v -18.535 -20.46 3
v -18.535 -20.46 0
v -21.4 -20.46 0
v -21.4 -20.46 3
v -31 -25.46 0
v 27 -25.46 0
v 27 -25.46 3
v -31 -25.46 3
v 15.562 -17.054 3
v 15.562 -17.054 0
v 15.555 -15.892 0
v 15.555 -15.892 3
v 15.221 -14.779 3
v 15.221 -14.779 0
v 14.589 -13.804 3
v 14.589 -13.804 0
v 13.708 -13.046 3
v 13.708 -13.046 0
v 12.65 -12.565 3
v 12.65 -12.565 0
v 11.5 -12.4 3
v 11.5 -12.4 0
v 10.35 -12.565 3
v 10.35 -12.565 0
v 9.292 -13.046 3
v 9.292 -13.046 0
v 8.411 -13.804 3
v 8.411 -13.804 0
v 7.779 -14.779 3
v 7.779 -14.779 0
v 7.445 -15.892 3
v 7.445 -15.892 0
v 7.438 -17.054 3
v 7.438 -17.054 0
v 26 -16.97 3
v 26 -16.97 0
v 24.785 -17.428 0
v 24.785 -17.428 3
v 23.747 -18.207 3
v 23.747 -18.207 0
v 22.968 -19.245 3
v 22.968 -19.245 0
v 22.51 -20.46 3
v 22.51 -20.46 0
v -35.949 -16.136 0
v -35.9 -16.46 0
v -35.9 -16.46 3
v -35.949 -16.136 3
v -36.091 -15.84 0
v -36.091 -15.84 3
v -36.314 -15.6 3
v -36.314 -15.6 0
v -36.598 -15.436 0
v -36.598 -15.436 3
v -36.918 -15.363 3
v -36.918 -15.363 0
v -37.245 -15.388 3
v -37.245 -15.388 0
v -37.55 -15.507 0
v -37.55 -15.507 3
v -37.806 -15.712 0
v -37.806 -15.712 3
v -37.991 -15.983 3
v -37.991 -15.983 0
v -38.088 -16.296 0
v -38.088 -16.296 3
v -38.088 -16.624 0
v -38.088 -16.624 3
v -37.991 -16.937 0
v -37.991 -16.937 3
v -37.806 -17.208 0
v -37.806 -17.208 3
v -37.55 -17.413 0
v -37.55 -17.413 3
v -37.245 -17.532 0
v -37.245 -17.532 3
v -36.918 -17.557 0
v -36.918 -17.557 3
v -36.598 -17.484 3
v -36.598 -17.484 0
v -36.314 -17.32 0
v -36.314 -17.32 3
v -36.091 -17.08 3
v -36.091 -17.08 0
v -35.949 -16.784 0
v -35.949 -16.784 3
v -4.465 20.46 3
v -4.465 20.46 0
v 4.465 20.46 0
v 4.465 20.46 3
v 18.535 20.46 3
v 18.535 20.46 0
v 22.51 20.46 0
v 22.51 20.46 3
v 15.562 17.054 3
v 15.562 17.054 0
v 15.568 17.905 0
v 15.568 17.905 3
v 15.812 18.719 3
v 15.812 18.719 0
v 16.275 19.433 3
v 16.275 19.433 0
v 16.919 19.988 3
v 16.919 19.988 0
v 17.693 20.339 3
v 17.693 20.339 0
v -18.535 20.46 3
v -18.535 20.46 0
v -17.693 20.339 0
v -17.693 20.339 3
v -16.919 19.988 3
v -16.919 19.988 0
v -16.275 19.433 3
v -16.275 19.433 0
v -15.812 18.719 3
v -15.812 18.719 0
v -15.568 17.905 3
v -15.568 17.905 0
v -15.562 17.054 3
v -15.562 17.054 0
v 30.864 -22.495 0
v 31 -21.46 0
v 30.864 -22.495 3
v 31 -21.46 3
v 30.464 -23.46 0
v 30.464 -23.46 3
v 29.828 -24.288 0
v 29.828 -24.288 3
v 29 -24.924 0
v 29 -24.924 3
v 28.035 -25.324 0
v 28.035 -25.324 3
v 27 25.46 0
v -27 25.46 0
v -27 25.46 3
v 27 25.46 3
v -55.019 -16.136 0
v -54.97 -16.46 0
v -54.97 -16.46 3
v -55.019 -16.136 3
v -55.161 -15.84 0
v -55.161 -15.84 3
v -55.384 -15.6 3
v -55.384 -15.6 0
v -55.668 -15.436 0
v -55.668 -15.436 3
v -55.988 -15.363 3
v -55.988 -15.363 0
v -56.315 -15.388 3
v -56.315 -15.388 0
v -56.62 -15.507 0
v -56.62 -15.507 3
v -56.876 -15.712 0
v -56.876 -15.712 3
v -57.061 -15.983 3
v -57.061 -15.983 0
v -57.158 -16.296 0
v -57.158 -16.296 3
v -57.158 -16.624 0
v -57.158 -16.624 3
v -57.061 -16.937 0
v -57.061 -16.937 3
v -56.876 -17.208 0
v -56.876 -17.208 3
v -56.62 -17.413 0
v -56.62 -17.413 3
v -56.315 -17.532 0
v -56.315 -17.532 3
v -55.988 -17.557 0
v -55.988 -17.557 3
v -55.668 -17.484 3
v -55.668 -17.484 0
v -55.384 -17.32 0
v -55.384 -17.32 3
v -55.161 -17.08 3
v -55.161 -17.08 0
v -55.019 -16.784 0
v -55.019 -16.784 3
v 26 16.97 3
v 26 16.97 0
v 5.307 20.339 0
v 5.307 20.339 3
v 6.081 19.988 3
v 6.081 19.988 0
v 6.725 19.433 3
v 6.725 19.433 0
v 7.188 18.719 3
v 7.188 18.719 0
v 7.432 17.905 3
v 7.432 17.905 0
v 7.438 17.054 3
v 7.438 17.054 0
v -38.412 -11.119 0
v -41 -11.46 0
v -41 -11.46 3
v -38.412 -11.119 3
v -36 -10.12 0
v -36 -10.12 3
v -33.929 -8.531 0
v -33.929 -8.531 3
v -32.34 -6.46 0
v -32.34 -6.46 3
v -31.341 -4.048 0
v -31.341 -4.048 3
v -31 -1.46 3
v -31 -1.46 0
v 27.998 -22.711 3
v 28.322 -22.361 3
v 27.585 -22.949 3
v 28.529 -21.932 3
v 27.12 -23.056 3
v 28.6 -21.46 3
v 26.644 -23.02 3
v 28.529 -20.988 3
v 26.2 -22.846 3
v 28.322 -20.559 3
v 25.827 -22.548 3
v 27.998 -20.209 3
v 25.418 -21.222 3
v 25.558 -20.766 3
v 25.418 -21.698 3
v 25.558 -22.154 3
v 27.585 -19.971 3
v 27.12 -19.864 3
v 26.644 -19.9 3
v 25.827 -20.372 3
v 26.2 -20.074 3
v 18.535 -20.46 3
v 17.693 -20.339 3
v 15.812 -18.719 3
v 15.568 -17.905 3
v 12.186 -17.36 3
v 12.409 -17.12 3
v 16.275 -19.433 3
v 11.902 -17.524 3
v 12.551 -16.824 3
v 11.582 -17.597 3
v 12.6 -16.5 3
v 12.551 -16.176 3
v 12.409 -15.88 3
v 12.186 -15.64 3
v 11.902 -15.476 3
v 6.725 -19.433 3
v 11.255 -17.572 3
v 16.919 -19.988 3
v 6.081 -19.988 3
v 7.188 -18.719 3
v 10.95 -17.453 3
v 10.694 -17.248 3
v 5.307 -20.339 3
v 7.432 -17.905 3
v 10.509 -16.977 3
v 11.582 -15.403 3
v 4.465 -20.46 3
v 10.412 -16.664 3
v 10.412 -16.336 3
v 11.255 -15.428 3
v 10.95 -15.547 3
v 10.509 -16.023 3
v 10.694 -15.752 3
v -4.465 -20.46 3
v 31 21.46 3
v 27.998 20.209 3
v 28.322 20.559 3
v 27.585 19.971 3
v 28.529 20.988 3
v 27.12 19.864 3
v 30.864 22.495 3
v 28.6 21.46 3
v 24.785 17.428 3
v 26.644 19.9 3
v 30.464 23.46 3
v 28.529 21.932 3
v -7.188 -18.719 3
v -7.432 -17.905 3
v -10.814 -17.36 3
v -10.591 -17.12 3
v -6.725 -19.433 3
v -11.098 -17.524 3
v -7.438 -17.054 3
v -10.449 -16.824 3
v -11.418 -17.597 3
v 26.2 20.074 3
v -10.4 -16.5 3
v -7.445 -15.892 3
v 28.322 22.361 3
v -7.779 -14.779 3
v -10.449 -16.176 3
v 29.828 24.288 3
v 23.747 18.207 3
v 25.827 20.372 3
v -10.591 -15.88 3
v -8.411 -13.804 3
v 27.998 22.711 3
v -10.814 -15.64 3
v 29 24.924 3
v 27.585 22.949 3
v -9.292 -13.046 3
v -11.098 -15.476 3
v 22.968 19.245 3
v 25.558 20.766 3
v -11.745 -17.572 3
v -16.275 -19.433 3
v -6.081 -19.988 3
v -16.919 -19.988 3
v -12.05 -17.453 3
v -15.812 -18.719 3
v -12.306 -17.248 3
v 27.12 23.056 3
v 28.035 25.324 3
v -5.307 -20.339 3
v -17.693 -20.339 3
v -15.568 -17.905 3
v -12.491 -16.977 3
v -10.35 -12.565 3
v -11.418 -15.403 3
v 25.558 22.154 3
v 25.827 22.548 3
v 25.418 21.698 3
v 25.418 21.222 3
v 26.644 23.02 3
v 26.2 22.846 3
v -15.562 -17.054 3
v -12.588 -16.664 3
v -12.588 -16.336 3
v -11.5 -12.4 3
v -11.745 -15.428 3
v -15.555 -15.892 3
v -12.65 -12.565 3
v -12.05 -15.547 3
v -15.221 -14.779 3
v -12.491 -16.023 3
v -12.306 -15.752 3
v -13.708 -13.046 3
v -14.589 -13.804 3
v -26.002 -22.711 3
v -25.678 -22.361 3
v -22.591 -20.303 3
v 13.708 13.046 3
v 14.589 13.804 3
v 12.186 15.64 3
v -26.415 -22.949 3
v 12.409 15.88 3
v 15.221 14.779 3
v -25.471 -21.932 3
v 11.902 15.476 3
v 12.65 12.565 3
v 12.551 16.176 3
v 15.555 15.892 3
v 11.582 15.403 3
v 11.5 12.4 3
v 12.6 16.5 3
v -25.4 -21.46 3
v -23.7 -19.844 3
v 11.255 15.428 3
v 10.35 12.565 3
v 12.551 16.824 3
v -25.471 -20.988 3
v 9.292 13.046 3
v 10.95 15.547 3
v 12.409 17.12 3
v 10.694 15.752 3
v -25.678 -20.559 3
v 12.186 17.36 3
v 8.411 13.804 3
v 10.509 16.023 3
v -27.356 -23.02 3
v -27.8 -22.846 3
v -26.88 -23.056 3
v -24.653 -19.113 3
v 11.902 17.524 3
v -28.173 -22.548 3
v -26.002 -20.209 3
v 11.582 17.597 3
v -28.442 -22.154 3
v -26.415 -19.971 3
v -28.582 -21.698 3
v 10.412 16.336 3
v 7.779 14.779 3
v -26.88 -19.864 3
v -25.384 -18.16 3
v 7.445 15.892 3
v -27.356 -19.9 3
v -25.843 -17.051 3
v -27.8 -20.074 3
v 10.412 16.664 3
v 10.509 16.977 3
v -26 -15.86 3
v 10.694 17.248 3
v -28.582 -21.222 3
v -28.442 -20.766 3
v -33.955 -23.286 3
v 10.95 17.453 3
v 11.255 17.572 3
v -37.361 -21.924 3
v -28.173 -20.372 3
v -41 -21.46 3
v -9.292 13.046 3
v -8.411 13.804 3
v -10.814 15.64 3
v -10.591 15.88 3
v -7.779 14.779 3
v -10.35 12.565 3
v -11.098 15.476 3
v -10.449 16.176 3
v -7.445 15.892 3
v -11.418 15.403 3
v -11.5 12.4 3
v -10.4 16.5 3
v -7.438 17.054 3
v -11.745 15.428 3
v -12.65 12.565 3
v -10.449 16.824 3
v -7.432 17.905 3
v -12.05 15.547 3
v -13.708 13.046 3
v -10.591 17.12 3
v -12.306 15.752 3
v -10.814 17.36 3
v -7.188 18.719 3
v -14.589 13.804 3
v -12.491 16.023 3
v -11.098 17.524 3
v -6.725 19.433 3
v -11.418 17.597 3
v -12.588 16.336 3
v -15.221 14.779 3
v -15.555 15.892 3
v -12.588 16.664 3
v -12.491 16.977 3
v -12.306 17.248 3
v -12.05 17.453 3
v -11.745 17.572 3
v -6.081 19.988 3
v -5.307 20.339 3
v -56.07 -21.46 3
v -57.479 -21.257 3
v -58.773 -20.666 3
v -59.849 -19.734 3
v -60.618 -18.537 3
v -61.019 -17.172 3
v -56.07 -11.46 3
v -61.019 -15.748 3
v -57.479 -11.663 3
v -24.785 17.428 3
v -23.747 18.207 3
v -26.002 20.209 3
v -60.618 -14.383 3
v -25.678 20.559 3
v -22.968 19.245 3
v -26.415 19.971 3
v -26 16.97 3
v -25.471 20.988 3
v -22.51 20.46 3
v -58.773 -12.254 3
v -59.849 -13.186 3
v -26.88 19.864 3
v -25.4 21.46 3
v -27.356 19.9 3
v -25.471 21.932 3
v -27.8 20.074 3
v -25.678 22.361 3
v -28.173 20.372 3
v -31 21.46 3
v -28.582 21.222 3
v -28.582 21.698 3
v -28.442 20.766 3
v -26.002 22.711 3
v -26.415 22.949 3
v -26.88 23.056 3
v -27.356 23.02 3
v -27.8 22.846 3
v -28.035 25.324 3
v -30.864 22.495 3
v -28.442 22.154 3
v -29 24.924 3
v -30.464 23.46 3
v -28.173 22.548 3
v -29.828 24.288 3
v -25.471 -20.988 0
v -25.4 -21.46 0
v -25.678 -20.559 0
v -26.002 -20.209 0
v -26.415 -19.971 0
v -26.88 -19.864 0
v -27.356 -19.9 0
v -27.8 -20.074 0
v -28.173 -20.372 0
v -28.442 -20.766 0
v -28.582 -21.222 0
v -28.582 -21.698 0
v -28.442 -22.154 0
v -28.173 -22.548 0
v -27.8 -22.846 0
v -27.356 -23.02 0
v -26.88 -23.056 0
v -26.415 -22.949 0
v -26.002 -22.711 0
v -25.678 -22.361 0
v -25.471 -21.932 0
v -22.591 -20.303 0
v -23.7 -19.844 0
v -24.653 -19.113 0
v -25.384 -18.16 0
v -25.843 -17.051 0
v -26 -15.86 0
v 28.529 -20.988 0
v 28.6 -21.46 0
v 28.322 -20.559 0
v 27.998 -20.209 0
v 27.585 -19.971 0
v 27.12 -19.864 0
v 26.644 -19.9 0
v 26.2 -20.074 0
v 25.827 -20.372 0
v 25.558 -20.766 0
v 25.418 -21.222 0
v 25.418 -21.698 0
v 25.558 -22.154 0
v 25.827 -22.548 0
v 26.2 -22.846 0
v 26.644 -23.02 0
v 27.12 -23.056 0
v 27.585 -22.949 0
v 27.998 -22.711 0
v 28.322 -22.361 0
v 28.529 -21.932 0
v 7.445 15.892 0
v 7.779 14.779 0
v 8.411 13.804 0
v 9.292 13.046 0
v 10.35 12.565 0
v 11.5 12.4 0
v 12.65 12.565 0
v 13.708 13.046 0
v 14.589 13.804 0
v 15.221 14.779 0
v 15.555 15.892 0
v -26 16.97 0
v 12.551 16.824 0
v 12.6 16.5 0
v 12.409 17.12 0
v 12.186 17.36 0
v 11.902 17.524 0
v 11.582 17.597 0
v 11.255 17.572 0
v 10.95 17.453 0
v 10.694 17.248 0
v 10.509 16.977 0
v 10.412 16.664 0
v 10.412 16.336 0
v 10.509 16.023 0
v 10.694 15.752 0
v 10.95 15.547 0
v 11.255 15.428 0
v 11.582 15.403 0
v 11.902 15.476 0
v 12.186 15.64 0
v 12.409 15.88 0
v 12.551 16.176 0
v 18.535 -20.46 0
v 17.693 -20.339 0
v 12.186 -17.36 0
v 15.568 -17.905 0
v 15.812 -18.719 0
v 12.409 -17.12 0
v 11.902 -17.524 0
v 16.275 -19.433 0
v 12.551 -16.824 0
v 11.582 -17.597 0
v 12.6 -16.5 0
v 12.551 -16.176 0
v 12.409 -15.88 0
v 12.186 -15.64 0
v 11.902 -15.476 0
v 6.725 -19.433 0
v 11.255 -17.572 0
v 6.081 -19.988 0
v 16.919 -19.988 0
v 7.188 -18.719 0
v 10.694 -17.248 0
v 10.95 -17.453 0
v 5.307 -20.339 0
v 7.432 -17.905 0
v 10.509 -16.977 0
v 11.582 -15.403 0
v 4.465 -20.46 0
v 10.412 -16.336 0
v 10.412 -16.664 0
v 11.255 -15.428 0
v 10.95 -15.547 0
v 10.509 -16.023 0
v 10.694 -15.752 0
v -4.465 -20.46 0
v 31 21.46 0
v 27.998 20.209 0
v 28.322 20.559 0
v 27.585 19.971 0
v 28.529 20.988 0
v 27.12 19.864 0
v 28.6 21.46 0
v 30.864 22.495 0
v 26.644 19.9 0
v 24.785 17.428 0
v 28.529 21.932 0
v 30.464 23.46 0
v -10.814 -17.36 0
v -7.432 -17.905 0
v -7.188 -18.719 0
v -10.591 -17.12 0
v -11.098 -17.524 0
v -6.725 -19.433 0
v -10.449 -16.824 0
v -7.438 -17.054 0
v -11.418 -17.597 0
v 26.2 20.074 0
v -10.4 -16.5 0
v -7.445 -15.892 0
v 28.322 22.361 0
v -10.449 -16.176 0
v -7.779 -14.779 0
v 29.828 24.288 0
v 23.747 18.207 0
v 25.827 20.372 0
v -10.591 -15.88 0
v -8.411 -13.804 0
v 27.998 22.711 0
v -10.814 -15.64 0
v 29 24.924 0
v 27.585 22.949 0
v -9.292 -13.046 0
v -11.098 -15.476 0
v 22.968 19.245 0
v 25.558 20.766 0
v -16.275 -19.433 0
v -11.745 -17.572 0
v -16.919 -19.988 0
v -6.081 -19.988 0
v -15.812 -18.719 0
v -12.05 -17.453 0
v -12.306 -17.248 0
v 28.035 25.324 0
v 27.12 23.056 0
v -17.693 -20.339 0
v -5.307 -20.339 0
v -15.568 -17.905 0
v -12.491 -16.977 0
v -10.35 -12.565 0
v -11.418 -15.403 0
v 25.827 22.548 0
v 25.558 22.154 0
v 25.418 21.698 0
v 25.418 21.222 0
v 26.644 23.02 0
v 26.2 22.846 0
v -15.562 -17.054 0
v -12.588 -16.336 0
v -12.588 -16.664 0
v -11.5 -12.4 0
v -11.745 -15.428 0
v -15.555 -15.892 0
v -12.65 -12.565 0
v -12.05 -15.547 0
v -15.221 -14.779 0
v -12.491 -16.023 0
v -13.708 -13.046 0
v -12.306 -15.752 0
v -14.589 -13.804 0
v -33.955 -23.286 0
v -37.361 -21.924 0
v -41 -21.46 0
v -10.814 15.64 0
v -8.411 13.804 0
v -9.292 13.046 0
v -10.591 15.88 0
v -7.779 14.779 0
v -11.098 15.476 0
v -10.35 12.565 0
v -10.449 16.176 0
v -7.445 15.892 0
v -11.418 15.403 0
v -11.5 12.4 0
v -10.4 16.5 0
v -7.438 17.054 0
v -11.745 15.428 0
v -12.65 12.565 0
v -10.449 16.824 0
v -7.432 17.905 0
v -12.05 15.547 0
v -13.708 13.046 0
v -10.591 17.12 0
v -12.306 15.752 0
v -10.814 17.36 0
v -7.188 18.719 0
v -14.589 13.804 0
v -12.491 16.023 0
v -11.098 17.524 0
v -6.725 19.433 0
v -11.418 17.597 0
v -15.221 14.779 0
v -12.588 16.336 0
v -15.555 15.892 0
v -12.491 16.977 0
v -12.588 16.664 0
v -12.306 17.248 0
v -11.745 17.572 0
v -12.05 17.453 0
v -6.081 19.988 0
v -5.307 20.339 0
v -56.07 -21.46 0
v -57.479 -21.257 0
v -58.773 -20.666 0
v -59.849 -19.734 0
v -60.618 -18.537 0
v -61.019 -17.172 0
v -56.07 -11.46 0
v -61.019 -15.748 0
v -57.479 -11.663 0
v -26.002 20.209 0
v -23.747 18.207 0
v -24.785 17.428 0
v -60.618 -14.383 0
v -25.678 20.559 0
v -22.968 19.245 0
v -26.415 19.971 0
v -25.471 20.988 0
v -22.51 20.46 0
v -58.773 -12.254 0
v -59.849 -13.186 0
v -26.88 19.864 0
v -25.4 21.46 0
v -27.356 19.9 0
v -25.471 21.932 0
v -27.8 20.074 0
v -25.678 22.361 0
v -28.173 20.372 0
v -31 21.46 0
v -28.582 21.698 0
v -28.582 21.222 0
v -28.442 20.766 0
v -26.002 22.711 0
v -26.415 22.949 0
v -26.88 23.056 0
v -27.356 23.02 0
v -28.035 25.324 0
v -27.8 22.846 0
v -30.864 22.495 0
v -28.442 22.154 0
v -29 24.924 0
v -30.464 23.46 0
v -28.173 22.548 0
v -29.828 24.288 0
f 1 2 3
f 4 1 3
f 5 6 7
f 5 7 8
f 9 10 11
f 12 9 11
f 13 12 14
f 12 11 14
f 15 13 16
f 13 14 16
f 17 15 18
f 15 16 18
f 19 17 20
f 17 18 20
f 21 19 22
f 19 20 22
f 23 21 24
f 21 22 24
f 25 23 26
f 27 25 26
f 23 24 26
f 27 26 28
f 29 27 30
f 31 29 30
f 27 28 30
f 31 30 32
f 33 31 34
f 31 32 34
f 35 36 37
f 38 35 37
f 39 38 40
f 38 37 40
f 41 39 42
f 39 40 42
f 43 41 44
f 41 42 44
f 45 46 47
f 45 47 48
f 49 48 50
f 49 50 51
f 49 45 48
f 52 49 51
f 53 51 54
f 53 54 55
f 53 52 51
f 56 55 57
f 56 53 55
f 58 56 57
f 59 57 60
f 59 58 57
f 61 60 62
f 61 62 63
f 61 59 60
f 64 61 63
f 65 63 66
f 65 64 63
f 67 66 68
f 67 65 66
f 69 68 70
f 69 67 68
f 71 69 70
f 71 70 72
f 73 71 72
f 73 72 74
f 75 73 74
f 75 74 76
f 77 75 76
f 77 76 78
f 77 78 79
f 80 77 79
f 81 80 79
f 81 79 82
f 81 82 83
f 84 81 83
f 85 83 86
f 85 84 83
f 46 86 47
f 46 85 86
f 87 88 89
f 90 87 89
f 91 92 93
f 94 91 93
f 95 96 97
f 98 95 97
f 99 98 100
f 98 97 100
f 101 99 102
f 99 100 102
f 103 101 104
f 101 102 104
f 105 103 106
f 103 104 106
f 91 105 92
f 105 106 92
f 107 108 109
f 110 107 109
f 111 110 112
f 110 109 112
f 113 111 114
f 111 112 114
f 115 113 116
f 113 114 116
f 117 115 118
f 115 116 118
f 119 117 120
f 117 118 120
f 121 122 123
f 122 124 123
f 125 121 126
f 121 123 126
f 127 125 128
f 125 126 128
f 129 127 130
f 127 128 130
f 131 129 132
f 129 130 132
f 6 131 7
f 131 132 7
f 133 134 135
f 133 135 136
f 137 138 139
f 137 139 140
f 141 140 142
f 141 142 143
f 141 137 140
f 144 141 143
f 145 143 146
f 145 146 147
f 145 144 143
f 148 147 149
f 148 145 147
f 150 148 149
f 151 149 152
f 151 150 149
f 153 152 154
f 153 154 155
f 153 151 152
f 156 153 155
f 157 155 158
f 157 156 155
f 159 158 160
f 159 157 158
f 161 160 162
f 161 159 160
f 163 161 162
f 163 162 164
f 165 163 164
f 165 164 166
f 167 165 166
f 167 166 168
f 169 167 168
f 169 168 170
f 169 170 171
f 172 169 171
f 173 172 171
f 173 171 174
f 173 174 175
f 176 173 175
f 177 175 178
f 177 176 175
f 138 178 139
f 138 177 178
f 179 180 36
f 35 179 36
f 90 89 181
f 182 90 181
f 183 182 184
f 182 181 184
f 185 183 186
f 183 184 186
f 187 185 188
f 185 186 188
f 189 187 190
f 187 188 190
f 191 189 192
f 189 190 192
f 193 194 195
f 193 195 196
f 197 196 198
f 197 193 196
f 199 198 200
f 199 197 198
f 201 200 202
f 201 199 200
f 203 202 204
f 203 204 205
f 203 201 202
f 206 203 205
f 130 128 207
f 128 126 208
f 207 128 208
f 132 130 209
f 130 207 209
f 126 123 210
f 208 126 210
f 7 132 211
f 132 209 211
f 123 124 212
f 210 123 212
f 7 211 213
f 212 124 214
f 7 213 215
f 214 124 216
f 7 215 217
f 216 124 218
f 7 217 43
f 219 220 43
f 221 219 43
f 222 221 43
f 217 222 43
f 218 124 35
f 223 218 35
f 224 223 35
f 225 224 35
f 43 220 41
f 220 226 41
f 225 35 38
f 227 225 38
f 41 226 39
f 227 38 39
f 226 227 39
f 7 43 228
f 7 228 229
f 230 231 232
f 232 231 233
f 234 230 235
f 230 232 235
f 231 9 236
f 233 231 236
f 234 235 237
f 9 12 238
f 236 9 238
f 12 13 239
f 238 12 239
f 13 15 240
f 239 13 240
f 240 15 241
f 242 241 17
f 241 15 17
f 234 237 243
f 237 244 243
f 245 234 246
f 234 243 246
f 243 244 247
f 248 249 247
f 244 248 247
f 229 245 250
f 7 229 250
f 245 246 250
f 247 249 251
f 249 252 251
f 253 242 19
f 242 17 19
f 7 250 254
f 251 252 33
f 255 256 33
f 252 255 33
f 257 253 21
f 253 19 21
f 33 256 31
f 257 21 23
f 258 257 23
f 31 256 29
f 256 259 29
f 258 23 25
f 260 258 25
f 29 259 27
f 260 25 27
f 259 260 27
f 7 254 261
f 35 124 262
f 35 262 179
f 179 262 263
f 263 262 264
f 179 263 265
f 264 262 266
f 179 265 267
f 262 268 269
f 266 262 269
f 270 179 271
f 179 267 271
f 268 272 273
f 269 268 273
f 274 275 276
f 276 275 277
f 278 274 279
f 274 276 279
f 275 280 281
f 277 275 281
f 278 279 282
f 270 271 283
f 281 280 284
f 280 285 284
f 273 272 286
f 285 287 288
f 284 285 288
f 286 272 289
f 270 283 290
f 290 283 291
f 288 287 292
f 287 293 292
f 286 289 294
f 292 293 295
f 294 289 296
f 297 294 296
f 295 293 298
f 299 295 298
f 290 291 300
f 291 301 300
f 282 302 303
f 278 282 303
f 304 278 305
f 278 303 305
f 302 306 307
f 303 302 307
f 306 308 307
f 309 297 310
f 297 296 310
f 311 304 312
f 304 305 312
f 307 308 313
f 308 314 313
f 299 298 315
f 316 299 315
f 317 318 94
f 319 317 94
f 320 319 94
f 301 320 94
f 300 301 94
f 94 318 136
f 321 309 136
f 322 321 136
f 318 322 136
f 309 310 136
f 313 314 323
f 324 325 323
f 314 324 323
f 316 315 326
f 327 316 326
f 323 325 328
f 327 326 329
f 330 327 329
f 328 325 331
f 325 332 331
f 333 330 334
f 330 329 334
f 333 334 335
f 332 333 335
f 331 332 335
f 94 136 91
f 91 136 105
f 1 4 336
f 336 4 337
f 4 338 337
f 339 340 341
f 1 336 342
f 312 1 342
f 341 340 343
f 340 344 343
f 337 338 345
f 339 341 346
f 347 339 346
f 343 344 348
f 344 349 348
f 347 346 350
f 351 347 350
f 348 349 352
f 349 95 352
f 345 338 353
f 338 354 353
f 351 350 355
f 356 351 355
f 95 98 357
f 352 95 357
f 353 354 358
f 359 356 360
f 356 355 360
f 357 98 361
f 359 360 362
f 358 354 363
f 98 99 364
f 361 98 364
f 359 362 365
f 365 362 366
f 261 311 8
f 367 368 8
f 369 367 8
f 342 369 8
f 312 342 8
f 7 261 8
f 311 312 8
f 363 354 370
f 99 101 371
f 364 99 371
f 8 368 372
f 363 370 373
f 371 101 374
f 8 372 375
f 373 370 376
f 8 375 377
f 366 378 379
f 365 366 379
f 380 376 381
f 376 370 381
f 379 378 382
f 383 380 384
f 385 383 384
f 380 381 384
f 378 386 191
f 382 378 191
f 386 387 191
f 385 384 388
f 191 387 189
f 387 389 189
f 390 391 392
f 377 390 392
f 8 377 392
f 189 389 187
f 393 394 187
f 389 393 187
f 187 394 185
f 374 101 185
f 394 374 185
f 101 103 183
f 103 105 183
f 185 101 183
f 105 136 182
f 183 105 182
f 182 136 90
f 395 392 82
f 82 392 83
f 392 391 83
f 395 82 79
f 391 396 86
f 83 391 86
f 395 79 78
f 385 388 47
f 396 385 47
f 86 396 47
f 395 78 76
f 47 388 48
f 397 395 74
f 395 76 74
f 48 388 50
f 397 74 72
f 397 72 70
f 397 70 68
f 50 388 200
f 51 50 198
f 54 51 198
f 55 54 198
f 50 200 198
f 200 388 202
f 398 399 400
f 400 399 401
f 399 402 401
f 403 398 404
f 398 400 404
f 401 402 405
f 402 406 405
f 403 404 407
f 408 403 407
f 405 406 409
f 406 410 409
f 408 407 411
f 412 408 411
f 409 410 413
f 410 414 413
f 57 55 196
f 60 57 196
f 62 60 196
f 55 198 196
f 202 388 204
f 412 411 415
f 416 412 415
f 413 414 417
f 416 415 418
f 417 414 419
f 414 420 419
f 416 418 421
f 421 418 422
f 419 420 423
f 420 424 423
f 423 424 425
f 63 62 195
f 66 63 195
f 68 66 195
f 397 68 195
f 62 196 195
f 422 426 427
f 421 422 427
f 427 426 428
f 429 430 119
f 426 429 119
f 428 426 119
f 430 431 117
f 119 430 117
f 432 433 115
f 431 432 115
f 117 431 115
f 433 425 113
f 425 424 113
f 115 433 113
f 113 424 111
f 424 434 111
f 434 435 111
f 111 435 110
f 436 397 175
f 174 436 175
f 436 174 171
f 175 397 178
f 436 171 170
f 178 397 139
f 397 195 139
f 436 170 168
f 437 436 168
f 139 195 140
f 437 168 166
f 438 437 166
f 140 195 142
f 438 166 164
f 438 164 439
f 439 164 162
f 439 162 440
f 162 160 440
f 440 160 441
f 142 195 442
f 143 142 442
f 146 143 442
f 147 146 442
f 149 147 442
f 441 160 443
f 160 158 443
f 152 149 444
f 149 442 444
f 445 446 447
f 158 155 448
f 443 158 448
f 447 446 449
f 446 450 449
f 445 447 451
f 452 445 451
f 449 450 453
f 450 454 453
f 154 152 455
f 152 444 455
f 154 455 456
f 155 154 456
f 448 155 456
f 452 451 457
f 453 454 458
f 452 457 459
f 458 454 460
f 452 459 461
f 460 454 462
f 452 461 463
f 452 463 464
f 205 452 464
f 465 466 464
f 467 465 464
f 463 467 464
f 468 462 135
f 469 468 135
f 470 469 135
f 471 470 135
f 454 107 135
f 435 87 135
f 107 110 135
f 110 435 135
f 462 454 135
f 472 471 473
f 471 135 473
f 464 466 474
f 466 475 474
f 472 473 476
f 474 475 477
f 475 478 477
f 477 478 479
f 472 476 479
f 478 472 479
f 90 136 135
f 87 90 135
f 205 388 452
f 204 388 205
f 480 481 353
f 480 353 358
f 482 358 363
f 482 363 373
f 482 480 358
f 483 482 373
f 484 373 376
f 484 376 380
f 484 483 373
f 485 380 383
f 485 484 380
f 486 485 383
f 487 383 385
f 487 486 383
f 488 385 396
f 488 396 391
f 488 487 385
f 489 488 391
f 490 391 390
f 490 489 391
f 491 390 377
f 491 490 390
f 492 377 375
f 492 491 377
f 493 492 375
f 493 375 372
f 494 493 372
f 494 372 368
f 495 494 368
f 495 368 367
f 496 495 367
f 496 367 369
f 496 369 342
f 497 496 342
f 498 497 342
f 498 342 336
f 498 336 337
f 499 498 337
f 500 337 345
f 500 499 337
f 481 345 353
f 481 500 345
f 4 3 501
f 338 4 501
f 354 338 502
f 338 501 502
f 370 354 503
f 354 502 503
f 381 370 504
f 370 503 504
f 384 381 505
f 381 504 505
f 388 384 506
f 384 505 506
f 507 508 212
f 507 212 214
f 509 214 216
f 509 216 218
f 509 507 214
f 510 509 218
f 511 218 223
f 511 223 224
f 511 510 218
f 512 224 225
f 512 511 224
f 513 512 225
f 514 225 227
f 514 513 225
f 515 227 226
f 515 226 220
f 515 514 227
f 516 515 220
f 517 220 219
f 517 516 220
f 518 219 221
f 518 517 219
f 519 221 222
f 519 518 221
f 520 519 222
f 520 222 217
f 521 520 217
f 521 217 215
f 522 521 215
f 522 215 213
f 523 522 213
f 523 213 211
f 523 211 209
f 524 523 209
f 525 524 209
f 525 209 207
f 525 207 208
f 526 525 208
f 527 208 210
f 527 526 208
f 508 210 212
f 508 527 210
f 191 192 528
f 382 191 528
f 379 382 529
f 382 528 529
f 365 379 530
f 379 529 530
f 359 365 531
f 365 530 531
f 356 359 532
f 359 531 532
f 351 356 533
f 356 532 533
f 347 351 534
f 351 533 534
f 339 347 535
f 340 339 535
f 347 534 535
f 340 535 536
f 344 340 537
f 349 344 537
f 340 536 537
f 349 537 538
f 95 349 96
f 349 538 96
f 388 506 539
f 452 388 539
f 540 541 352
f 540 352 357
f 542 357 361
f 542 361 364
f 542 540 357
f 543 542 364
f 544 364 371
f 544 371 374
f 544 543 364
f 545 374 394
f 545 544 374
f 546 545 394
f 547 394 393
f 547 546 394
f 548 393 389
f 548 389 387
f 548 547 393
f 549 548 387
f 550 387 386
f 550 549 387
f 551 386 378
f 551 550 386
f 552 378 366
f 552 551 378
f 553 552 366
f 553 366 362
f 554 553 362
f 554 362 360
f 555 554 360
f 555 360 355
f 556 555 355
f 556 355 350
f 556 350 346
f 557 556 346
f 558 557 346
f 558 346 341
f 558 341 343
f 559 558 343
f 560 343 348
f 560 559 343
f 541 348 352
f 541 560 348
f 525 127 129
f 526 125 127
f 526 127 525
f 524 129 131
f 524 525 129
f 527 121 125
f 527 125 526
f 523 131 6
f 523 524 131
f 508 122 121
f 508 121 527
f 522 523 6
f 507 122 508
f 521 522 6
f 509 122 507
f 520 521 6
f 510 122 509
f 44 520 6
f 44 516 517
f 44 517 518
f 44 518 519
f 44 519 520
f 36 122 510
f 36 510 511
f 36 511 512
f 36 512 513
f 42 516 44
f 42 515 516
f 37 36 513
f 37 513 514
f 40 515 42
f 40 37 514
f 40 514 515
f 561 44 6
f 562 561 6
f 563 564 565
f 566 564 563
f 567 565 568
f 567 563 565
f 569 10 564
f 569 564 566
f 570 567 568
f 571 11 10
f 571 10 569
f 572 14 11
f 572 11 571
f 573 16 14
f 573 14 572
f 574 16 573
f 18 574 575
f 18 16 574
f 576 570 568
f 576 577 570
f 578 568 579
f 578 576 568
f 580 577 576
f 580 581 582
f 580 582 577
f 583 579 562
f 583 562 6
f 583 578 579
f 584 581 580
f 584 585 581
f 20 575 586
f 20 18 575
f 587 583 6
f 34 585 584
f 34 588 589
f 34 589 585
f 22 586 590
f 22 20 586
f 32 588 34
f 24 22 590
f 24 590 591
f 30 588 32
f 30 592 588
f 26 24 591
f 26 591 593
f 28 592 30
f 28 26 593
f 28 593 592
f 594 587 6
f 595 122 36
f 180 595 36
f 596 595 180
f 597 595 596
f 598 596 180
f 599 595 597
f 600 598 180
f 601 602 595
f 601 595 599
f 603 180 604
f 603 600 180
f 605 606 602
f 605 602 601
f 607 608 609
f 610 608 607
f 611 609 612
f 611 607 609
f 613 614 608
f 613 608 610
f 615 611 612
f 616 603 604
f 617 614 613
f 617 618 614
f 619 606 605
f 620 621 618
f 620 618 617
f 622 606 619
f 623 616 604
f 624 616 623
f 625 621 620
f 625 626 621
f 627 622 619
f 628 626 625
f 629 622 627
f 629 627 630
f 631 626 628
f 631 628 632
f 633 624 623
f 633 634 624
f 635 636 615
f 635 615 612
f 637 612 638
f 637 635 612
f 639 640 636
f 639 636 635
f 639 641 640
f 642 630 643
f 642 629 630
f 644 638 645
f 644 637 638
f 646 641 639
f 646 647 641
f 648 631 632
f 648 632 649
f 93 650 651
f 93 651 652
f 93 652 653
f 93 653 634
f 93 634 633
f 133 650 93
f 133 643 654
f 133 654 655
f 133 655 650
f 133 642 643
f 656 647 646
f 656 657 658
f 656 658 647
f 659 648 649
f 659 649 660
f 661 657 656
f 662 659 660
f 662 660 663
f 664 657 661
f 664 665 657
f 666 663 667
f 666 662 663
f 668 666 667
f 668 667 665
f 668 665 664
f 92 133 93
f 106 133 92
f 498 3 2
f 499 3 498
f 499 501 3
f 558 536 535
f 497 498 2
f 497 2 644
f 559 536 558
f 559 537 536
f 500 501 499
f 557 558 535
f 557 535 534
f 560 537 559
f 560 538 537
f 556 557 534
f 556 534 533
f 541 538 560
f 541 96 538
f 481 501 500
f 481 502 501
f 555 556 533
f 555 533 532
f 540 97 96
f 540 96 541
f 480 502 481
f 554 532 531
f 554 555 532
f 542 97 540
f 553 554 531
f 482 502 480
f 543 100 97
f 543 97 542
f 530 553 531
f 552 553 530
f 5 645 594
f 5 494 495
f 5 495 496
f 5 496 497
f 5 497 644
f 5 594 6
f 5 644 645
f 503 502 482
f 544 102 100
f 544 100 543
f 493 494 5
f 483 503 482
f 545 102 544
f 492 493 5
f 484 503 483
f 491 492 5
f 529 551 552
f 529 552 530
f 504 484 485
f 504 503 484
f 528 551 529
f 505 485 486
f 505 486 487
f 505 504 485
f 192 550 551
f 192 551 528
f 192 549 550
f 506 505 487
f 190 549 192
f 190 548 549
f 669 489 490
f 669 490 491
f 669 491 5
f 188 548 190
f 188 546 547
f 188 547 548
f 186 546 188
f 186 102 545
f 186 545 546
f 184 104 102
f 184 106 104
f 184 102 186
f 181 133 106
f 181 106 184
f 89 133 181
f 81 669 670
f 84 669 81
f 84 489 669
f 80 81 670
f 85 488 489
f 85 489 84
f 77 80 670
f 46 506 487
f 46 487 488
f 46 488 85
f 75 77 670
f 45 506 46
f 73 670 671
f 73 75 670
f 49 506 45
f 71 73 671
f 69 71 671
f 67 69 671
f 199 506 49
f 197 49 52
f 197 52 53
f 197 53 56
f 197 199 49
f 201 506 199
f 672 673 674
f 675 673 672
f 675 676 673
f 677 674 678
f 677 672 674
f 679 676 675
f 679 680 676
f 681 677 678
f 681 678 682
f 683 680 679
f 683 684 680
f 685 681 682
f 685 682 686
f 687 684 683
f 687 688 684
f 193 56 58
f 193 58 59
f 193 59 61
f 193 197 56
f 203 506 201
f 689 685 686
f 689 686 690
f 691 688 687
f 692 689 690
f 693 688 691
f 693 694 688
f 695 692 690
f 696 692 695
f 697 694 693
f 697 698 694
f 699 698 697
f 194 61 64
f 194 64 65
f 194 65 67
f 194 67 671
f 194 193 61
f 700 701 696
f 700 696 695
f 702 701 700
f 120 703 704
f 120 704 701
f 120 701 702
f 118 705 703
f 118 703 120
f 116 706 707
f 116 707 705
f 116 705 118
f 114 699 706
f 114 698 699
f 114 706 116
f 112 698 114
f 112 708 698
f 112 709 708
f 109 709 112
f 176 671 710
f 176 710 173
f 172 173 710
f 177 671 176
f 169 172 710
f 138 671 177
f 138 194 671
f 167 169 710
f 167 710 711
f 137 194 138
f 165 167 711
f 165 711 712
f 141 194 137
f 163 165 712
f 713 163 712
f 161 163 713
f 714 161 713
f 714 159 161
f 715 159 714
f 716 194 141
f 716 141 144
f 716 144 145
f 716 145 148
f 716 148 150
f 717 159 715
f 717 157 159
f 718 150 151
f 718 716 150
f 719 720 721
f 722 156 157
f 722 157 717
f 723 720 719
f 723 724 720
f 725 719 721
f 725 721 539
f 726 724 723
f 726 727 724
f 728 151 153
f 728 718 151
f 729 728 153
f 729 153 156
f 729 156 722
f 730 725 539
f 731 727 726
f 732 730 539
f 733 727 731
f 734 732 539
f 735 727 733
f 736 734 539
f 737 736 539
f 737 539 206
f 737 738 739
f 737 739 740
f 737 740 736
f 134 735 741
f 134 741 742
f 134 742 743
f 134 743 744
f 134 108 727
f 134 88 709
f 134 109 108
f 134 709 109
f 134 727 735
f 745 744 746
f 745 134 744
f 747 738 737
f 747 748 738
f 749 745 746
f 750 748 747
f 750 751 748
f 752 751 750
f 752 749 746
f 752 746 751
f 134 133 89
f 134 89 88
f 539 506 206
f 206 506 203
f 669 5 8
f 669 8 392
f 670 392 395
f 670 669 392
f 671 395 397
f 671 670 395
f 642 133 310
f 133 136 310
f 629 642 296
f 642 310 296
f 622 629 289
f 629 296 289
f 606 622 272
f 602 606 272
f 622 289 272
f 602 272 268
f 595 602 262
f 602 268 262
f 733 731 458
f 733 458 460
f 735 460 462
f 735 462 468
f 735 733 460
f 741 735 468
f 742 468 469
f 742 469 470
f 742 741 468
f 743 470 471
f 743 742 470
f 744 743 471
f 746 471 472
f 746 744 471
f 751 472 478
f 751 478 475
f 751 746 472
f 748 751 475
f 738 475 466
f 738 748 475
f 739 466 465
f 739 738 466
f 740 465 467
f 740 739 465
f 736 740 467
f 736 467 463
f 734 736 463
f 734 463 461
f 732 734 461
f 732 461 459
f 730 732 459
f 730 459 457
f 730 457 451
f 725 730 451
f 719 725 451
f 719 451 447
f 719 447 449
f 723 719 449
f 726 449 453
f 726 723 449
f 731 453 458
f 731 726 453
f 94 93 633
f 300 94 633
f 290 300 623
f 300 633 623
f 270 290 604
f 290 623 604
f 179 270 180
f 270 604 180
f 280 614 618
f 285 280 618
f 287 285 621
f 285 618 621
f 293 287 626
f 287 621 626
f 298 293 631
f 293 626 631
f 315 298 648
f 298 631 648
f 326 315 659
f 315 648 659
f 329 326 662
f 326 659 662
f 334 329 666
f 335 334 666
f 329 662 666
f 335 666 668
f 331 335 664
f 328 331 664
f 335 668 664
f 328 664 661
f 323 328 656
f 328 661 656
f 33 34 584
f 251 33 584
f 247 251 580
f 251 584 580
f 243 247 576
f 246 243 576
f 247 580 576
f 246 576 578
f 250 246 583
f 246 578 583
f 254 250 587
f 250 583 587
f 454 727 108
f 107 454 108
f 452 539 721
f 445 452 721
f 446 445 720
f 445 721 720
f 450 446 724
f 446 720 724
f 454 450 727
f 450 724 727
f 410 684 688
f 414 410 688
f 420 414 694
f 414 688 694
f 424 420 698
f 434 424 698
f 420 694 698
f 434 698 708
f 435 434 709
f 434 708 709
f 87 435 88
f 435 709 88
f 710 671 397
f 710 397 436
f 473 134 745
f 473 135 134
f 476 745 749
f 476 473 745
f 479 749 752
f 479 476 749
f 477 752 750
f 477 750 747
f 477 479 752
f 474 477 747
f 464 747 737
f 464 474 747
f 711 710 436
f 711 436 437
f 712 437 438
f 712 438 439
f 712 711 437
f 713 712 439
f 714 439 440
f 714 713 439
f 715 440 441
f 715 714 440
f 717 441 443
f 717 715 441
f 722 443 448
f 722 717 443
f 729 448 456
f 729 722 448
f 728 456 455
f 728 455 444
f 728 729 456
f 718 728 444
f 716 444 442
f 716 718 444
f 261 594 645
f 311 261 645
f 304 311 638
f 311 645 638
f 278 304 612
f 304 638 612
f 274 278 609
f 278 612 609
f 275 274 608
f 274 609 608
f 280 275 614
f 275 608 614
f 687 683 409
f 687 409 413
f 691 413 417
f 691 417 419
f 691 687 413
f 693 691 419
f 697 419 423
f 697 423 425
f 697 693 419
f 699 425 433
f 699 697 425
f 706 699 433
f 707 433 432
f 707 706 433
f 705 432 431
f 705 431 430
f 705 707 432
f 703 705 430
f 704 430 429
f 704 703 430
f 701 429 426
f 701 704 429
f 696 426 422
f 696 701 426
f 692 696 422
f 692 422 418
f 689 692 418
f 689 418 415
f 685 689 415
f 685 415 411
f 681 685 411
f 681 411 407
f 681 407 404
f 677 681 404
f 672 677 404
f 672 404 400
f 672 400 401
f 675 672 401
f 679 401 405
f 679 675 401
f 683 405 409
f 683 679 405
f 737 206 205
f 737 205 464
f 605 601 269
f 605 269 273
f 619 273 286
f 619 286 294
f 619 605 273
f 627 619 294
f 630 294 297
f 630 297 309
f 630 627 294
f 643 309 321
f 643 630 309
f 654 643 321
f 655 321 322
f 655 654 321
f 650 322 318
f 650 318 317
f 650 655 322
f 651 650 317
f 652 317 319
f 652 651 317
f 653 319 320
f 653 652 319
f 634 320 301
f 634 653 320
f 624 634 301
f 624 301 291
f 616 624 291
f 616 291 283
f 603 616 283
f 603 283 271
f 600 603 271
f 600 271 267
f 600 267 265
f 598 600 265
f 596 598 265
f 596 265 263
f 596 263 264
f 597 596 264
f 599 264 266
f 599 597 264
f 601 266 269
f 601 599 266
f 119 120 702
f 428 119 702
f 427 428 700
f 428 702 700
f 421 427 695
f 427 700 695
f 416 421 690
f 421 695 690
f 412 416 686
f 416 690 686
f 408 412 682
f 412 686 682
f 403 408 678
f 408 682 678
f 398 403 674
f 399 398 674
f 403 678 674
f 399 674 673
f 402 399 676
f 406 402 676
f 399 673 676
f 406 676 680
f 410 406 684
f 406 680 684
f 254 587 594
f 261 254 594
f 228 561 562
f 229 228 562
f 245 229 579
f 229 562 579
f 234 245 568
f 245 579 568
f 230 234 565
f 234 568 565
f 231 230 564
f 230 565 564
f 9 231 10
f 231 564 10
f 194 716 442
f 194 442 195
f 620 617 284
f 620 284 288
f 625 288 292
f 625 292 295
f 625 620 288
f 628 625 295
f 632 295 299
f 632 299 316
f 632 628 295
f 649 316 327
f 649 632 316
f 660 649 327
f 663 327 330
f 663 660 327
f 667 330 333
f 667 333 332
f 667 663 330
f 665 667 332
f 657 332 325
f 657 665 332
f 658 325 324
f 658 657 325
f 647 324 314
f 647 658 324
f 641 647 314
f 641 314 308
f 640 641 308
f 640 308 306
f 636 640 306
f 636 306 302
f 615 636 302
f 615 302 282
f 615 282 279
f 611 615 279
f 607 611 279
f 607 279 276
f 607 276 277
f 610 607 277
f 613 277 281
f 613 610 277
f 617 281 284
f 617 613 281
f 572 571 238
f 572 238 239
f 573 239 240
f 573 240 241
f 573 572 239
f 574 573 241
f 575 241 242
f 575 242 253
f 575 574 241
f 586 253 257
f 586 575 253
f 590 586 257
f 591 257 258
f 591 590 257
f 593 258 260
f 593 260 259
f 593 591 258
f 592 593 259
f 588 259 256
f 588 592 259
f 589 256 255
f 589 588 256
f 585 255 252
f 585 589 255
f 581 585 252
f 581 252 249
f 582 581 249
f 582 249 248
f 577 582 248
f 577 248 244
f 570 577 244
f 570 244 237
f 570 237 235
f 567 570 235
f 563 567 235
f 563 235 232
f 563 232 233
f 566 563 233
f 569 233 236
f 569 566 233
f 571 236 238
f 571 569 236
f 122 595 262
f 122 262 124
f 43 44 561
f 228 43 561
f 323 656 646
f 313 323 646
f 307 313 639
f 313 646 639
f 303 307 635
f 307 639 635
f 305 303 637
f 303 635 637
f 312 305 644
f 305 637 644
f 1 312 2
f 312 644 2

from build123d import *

# Parameters (mm, degrees)
SKETCH_1_R      = 1.6
SKETCH_1_R_2    = 1.1
EXTRUDE_1_DEPTH = 3
FILLET_2_R      = 4


with BuildPart() as part:
    # 草图1 → 凸台-拉伸1 (new body)
    with BuildSketch(Plane.XY):
        with BuildLine():
            Line((-31, 25.46), (31, 25.46))
            Line((31, 25.46), (31, -25.46))
            Line((31, -25.46), (-31, -25.46))
            ThreePointArc((-31, -25.46), (-35.614835193, -22.497087982), (-41, -21.46))
            Line((-41, -21.46), (-56.07, -21.46))
            ThreePointArc((-56.07, -21.46), (-61.07, -16.46), (-56.07, -11.46))
            Line((-56.07, -11.46), (-41, -11.46))
            ThreePointArc((-41, -11.46), (-33.928932188, -8.531067812), (-31, -1.46))
            Line((-31, -1.46), (-31, 25.46))
        make_face()
        with Locations((-27, 21.46)):
            Circle(SKETCH_1_R, mode=Mode.SUBTRACT)
        with Locations((27, 21.46)):
            Circle(SKETCH_1_R, mode=Mode.SUBTRACT)
        with Locations((-27, -21.46)):
            Circle(SKETCH_1_R, mode=Mode.SUBTRACT)
        with Locations((27, -21.46)):
            Circle(SKETCH_1_R, mode=Mode.SUBTRACT)
        with Locations((-11.5, 16.5)):
            Circle(SKETCH_1_R_2, mode=Mode.SUBTRACT)
        with Locations((11.5, 16.5)):
            Circle(SKETCH_1_R_2, mode=Mode.SUBTRACT)
        with Locations((11.5, -16.5)):
            Circle(SKETCH_1_R_2, mode=Mode.SUBTRACT)
        with Locations((-11.5, -16.5)):
            Circle(SKETCH_1_R_2, mode=Mode.SUBTRACT)
        with Locations((-56.07, -16.46)):
            Circle(SKETCH_1_R_2, mode=Mode.SUBTRACT)
        with Locations((-37, -16.46)):
            Circle(SKETCH_1_R_2, mode=Mode.SUBTRACT)
        with BuildLine():
            Line((-22.510011136, 20.46), (-18.534799215, 20.46))
            ThreePointArc((-18.534799215, 20.46), (-16.274611014, 19.432701015), (-15.562348843, 17.054366197))
            ThreePointArc((-15.562348843, 17.054366197), (-11.5, 12.4), (-7.437651157, 17.054366197))
            ThreePointArc((-7.437651157, 17.054366197), (-6.725388986, 19.432701015), (-4.465200785, 20.46))
            Line((-4.465200785, 20.46), (4.465200785, 20.46))
            ThreePointArc((4.465200785, 20.46), (6.725388986, 19.432701015), (7.437651157, 17.054366197))
            ThreePointArc((7.437651157, 17.054366197), (11.5, 12.4), (15.562348843, 17.054366197))
            ThreePointArc((15.562348843, 17.054366197), (16.274611014, 19.432701015), (18.534799215, 20.46))
            Line((18.534799215, 20.46), (22.510011136, 20.46))
            ThreePointArc((22.510011136, 20.46), (23.747308807, 18.207308807), (26, 16.970011136))
            Line((26, 16.970011136), (26, -16.970011136))
            ThreePointArc((26, -16.970011136), (23.747308807, -18.207308807), (22.510011136, -20.46))
            Line((22.510011136, -20.46), (18.534799215, -20.46))
            ThreePointArc((18.534799215, -20.46), (16.274611014, -19.432701015), (15.562348843, -17.054366197))
            ThreePointArc((15.562348843, -17.054366197), (11.5, -12.4), (7.437651157, -17.054366197))
            ThreePointArc((7.437651157, -17.054366197), (6.725388986, -19.432701015), (4.465200785, -20.46))
            Line((4.465200785, -20.46), (-4.465200785, -20.46))
            ThreePointArc((-4.465200785, -20.46), (-6.725388986, -19.432701015), (-7.437651157, -17.054366197))
            ThreePointArc((-7.437651157, -17.054366197), (-11.5, -12.4), (-15.562348843, -17.054366197))
            ThreePointArc((-15.562348843, -17.054366197), (-16.274611014, -19.432701015), (-18.534799215, -20.46))
            Line((-18.534799215, -20.46), (-21.4, -20.46))
            ThreePointArc((-21.4, -20.46), (-24.652691193, -19.112691193), (-26, -15.86))
            Line((-26, -15.86), (-26, 16.970011136))
            ThreePointArc((-26, 16.970011136), (-23.747308807, 18.207308807), (-22.510011136, 20.46))
        make_face(mode=Mode.SUBTRACT)
    extrude(amount=EXTRUDE_1_DEPTH)

    # 圆角2
    fillet_2_edges = [part.edges().sort_by_distance(p)[0] for p in [
        (-31, 25.46, 1.5),
        (31, 25.46, 1.5),
        (31, -25.46, 1.5),
    ]]
    fillet(fillet_2_edges, radius=FILLET_2_R)


solid = part.part
